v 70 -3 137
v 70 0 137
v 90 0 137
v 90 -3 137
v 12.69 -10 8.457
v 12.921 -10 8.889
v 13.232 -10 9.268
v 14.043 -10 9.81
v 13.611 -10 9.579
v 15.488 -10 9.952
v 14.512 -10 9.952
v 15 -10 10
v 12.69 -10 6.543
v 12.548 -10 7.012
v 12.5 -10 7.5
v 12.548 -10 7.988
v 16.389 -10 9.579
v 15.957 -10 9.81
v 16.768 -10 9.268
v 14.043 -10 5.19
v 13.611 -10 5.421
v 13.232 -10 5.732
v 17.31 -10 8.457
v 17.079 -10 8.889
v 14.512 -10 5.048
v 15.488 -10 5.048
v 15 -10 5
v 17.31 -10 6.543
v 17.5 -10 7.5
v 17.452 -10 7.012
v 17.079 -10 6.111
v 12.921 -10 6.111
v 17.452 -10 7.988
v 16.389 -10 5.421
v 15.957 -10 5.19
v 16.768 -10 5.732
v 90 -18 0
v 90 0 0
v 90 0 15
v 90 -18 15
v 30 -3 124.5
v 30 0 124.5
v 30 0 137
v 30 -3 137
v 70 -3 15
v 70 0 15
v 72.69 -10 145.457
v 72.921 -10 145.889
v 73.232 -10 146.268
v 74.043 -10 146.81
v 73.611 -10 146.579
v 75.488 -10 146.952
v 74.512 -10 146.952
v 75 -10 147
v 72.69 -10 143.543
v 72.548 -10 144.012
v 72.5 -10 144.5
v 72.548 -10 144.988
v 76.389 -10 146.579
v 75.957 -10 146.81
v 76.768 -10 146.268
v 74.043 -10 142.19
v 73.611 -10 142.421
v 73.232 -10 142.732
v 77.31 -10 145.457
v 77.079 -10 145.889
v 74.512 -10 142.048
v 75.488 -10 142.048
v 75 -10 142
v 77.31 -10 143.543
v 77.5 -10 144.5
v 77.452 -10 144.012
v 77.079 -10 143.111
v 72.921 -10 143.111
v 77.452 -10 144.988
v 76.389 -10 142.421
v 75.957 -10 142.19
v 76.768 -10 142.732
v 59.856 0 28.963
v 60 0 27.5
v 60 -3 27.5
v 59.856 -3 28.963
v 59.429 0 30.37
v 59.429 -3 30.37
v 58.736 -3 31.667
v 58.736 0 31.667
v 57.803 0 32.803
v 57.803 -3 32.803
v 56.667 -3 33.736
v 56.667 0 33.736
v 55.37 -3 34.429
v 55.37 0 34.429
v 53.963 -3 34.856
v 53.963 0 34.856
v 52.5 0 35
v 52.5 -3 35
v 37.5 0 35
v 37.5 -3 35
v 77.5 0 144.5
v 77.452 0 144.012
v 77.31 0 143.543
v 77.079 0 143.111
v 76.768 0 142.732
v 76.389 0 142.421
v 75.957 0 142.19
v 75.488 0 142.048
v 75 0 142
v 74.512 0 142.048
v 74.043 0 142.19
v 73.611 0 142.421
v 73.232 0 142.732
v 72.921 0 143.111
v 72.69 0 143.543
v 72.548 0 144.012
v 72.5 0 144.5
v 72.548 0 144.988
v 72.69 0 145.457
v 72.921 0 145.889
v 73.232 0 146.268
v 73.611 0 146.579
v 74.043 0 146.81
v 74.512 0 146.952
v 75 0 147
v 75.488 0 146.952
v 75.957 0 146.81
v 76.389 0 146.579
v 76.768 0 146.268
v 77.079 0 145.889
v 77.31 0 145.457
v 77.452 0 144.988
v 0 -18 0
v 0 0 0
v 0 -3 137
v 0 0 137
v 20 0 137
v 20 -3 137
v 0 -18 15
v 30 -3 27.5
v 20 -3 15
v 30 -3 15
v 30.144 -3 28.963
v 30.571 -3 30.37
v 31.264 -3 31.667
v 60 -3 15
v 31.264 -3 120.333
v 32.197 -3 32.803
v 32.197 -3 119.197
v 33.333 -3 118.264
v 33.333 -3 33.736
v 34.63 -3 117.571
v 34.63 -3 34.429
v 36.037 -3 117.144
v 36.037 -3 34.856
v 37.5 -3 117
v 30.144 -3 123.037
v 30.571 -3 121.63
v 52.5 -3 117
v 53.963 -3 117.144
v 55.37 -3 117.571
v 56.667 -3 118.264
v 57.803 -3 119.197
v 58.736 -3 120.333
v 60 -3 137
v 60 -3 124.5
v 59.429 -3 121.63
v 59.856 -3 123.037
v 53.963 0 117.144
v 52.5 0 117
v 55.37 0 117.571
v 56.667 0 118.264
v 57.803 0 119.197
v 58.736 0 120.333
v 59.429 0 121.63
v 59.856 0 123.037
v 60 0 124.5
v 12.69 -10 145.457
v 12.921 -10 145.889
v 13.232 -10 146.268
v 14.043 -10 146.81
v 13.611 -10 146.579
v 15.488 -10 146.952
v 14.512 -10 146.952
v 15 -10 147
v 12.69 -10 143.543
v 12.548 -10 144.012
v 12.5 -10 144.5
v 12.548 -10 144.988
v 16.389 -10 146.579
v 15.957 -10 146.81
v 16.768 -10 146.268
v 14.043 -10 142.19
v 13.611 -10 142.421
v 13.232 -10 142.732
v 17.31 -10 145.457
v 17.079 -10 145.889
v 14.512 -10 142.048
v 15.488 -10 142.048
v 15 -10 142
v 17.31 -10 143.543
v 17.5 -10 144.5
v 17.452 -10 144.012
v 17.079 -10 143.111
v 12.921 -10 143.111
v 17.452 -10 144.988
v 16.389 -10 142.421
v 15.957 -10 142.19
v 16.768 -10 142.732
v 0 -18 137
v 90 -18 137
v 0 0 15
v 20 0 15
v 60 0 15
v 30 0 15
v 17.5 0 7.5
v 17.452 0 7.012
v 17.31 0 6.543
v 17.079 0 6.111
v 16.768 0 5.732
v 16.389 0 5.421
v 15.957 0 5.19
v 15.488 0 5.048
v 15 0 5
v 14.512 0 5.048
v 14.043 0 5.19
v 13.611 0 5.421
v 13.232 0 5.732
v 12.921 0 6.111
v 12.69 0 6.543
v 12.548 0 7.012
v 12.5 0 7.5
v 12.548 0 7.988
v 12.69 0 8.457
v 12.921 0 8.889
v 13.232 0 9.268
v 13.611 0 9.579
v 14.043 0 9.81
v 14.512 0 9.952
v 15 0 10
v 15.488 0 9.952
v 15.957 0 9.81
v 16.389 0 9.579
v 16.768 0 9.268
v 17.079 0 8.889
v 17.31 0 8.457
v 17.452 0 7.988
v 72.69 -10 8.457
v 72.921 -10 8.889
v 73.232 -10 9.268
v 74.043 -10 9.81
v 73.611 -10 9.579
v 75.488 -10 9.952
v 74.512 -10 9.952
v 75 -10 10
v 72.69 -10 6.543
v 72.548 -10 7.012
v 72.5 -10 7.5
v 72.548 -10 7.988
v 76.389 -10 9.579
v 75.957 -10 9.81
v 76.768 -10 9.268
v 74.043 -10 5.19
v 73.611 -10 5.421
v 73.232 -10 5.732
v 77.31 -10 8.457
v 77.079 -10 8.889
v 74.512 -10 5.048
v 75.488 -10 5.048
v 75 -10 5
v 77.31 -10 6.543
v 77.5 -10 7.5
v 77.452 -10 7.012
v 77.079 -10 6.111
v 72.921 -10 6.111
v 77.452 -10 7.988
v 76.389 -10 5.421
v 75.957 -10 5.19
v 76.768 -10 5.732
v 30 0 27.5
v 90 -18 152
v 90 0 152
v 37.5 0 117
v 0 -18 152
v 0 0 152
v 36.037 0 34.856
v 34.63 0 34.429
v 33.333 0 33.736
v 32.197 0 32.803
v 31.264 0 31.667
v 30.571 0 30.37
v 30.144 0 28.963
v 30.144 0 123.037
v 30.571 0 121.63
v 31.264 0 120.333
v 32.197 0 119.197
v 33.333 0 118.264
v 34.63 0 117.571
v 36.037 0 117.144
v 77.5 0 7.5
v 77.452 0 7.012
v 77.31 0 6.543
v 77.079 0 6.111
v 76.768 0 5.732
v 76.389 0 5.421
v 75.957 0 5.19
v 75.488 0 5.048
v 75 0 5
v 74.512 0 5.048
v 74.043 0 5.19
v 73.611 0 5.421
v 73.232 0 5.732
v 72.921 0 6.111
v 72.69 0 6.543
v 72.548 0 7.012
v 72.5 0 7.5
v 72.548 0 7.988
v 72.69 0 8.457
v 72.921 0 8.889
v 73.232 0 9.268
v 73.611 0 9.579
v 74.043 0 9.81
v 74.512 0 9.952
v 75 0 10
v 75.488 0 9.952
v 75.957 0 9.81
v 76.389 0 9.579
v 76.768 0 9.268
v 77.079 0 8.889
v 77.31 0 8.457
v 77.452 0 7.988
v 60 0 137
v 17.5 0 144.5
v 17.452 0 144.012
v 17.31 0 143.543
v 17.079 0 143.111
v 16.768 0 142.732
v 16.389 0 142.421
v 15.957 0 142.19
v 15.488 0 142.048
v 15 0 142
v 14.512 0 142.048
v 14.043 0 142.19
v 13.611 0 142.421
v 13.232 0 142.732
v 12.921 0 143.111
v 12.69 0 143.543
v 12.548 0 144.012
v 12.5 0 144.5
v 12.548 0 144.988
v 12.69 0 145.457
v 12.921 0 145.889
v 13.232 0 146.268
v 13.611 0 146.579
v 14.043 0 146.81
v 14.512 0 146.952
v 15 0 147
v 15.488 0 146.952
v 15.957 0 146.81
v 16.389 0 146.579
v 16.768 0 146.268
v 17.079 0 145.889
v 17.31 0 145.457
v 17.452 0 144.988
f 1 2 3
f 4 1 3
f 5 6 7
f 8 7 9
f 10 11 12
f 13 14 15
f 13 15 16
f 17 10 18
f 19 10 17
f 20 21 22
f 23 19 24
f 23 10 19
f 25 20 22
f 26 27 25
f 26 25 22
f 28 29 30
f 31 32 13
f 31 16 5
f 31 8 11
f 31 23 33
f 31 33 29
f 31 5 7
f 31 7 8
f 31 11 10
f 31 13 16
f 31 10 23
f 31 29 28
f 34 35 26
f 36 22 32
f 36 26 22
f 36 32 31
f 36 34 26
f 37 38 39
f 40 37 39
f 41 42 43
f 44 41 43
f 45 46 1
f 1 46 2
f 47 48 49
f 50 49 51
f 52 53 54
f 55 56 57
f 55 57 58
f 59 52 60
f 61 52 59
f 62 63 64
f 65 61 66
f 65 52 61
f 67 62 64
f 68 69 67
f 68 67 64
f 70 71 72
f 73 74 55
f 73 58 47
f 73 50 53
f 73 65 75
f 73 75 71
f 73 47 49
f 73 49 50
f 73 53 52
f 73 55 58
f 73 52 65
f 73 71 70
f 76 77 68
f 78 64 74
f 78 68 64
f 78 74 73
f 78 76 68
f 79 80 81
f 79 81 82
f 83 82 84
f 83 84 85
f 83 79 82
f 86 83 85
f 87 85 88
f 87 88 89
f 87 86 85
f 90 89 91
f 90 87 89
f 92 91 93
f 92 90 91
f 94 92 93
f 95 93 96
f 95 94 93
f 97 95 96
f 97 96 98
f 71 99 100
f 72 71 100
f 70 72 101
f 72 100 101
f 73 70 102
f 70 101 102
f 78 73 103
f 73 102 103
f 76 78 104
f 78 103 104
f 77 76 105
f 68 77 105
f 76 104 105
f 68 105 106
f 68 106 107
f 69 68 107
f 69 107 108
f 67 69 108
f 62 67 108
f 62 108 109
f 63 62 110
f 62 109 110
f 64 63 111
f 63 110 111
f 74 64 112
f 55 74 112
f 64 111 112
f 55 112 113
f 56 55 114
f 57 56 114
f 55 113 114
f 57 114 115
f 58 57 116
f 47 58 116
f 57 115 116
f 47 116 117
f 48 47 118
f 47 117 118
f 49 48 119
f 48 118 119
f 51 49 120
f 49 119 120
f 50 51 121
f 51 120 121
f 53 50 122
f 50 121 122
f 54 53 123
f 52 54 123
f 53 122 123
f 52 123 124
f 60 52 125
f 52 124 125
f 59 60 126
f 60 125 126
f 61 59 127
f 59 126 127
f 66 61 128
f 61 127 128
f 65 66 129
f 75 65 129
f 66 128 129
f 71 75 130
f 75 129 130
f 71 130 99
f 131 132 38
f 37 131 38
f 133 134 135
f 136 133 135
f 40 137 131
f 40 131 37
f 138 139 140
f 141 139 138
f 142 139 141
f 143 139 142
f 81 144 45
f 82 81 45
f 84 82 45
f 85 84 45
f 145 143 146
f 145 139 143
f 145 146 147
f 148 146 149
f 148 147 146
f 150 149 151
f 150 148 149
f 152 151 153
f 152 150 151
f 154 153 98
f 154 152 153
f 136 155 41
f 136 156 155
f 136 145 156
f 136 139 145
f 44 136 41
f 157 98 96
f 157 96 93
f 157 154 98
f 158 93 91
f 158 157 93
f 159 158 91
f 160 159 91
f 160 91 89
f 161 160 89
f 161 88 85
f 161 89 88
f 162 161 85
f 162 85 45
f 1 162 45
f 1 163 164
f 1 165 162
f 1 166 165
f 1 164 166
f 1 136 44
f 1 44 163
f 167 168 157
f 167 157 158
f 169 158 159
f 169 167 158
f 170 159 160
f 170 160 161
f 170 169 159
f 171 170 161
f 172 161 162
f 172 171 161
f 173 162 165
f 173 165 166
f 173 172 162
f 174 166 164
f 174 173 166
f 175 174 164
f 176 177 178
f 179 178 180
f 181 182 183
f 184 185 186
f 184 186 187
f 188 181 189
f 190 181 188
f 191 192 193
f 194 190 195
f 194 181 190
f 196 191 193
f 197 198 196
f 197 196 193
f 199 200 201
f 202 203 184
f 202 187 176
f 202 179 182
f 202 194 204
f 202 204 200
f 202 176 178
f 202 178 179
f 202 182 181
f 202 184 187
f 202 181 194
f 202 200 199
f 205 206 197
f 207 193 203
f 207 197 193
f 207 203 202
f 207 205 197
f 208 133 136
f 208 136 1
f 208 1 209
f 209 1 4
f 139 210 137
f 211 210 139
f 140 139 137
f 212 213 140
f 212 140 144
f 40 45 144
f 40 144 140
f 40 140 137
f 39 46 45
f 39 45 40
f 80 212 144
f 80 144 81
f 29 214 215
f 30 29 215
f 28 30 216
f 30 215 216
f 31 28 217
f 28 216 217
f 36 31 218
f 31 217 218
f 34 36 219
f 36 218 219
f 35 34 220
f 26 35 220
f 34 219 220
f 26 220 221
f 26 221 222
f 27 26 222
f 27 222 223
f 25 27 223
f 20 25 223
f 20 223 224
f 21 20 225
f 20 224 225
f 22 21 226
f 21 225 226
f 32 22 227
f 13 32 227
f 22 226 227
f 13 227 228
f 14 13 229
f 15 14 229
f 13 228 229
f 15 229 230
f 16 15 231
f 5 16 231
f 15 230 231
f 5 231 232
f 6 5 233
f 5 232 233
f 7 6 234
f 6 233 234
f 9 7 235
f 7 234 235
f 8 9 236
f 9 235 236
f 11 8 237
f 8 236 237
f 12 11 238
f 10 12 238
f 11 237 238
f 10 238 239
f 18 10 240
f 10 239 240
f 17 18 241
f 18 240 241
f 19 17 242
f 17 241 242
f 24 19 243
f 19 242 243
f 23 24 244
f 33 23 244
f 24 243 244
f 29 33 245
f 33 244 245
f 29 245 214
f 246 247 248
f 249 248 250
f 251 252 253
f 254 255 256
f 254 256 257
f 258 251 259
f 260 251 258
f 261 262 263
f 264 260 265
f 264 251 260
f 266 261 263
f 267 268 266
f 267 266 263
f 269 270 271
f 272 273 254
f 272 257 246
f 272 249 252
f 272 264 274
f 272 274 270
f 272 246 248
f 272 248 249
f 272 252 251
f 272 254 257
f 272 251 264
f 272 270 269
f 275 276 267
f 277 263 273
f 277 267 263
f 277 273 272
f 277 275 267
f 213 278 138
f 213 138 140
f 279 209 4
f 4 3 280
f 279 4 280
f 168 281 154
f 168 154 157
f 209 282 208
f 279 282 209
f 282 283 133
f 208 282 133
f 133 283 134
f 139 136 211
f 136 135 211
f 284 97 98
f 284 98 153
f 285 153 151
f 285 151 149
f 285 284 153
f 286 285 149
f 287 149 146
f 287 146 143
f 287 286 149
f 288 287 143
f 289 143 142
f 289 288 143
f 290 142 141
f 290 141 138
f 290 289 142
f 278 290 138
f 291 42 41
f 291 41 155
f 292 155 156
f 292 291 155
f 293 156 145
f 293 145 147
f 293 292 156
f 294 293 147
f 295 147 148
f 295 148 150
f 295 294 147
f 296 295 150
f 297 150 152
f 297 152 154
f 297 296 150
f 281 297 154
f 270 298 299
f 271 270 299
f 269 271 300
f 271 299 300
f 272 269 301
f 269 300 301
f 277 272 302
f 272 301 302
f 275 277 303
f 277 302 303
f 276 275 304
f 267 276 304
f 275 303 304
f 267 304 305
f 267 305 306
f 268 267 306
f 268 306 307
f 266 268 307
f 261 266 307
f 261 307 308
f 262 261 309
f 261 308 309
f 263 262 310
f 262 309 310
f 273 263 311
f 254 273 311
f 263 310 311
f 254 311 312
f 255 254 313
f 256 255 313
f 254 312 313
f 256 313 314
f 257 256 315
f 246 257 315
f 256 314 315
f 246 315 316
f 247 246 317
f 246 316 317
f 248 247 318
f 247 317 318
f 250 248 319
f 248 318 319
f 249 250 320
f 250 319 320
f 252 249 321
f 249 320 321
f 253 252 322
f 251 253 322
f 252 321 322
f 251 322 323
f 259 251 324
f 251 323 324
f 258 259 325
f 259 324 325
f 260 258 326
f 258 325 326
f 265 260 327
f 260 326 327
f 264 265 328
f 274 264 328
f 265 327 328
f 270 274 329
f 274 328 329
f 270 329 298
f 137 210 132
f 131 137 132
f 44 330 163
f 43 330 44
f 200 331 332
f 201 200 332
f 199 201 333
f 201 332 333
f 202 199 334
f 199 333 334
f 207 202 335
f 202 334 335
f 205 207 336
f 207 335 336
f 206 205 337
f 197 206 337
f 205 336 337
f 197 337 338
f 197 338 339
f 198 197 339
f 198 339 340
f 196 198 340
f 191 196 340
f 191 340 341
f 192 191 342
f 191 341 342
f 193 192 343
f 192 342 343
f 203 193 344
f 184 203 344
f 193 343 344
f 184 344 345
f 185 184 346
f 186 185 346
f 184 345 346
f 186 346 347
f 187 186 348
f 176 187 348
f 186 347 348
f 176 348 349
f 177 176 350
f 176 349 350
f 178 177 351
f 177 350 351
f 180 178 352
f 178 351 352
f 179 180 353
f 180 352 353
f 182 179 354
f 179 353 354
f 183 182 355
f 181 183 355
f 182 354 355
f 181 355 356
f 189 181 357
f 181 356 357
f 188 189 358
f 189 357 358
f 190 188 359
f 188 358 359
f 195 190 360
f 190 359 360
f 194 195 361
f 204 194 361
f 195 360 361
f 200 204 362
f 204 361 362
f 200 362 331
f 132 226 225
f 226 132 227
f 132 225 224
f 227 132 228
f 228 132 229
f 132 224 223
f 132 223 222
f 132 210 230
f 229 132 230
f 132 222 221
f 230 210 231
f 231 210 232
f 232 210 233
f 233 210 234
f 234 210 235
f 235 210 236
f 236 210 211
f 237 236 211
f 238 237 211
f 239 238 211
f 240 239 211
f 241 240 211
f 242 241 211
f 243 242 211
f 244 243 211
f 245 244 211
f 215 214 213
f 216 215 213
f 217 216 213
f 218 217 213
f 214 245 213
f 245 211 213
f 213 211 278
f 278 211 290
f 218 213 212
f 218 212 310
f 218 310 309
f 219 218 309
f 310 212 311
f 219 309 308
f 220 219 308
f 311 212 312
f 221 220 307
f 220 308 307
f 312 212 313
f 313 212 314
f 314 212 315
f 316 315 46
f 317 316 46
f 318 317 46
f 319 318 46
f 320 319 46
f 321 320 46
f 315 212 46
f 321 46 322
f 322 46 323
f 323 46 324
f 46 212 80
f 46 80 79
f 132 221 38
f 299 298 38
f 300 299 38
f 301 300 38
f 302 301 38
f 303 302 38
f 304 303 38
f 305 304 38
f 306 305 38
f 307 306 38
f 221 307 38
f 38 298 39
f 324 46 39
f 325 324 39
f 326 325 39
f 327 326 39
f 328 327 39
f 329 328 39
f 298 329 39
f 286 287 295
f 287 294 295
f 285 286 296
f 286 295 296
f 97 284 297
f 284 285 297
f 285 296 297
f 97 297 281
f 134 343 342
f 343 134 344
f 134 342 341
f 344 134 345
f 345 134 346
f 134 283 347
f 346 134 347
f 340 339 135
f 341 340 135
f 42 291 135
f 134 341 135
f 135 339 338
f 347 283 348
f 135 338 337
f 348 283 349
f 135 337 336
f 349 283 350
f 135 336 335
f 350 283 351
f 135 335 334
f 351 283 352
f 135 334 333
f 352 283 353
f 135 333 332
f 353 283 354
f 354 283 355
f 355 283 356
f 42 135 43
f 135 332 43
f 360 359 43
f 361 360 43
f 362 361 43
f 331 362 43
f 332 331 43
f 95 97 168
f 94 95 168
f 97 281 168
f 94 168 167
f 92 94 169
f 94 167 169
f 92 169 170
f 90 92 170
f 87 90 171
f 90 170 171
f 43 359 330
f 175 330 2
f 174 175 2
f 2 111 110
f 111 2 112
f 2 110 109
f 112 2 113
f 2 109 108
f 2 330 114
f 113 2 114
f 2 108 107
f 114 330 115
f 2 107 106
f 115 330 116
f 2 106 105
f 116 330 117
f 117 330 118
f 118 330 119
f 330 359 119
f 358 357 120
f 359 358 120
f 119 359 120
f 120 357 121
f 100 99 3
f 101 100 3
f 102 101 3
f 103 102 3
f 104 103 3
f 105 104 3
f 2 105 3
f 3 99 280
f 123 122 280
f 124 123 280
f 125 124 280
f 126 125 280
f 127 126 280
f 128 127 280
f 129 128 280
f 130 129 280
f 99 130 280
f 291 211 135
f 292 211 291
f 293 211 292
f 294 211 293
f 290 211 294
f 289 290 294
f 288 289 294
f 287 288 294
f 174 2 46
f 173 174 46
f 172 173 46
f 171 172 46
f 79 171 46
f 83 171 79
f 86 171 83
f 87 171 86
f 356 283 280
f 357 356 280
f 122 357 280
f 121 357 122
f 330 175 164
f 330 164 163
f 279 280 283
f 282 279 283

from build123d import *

# Parameters (mm, degrees)
PAD_DEPTH    = 3
SKETCH001_W  = 90
SKETCH001_H  = 15
PAD001_DEPTH = 15
SKETCH002_R  = 2.5
POCKET_DEPTH = 10


with BuildPart() as part:
    # Sketch → Pad (new body)
    with BuildSketch(Plane.XZ):
        Polygon((0, 152), (0, 137), (20, 137.000045), (20, 15), (0, 15), (0, 0), (90, 0), (90, 15), (70, 15), (70, 137.000045), (90, 137.000045), (90, 152), align=None)
        with BuildLine():
            ThreePointArc((30, 124.5), (32.196699, 119.196699), (37.5, 117))
            Line((37.5, 117), (52.5, 117))
            ThreePointArc((52.5, 117), (57.803301, 119.196699), (60, 124.5))
            Line((60, 124.5), (60, 137))
            Line((60, 137), (30, 137))
            Line((30, 124.5), (30, 137))
        make_face(mode=Mode.SUBTRACT)
        with BuildLine():
            ThreePointArc((37.5, 35), (32.196699, 32.803301), (30, 27.5))
            Line((30, 27.5), (30, 15))
            Line((30, 15), (60, 15))
            Line((60, 15), (60, 27.5))
            ThreePointArc((60, 27.5), (57.803301, 32.803301), (52.5, 35))
            Line((52.5, 35), (37.5, 35))
        make_face(mode=Mode.SUBTRACT)
    extrude(amount=PAD_DEPTH)

    # Sketch001 (on Face26 of Pad) → Pad001 (join)
    with BuildSketch(Plane.XZ.offset(3)):
        Polygon((0, 152), (0, 137), (90, 137.000045), (90, 152), align=None)
        with Locations((45, 7.5)):
            Rectangle(SKETCH001_W, SKETCH001_H)
    extrude(amount=PAD001_DEPTH)

    # Sketch002 (on Face2 of Pad001) → Pocket (cut)
    with BuildSketch(Plane(origin=(0, 0, 0), x_dir=(1, 0, 0), z_dir=(0, 1, 0))):
        with Locations((15, -7.5)):
            Circle(SKETCH002_R)
        with Locations((75, -7.5)):
            Circle(SKETCH002_R)
        with Locations((75, -144.5)):
            Circle(SKETCH002_R)
        with Locations((15, -144.5)):
            Circle(SKETCH002_R)
    extrude(amount=-POCKET_DEPTH, mode=Mode.SUBTRACT)


solid = part.part
